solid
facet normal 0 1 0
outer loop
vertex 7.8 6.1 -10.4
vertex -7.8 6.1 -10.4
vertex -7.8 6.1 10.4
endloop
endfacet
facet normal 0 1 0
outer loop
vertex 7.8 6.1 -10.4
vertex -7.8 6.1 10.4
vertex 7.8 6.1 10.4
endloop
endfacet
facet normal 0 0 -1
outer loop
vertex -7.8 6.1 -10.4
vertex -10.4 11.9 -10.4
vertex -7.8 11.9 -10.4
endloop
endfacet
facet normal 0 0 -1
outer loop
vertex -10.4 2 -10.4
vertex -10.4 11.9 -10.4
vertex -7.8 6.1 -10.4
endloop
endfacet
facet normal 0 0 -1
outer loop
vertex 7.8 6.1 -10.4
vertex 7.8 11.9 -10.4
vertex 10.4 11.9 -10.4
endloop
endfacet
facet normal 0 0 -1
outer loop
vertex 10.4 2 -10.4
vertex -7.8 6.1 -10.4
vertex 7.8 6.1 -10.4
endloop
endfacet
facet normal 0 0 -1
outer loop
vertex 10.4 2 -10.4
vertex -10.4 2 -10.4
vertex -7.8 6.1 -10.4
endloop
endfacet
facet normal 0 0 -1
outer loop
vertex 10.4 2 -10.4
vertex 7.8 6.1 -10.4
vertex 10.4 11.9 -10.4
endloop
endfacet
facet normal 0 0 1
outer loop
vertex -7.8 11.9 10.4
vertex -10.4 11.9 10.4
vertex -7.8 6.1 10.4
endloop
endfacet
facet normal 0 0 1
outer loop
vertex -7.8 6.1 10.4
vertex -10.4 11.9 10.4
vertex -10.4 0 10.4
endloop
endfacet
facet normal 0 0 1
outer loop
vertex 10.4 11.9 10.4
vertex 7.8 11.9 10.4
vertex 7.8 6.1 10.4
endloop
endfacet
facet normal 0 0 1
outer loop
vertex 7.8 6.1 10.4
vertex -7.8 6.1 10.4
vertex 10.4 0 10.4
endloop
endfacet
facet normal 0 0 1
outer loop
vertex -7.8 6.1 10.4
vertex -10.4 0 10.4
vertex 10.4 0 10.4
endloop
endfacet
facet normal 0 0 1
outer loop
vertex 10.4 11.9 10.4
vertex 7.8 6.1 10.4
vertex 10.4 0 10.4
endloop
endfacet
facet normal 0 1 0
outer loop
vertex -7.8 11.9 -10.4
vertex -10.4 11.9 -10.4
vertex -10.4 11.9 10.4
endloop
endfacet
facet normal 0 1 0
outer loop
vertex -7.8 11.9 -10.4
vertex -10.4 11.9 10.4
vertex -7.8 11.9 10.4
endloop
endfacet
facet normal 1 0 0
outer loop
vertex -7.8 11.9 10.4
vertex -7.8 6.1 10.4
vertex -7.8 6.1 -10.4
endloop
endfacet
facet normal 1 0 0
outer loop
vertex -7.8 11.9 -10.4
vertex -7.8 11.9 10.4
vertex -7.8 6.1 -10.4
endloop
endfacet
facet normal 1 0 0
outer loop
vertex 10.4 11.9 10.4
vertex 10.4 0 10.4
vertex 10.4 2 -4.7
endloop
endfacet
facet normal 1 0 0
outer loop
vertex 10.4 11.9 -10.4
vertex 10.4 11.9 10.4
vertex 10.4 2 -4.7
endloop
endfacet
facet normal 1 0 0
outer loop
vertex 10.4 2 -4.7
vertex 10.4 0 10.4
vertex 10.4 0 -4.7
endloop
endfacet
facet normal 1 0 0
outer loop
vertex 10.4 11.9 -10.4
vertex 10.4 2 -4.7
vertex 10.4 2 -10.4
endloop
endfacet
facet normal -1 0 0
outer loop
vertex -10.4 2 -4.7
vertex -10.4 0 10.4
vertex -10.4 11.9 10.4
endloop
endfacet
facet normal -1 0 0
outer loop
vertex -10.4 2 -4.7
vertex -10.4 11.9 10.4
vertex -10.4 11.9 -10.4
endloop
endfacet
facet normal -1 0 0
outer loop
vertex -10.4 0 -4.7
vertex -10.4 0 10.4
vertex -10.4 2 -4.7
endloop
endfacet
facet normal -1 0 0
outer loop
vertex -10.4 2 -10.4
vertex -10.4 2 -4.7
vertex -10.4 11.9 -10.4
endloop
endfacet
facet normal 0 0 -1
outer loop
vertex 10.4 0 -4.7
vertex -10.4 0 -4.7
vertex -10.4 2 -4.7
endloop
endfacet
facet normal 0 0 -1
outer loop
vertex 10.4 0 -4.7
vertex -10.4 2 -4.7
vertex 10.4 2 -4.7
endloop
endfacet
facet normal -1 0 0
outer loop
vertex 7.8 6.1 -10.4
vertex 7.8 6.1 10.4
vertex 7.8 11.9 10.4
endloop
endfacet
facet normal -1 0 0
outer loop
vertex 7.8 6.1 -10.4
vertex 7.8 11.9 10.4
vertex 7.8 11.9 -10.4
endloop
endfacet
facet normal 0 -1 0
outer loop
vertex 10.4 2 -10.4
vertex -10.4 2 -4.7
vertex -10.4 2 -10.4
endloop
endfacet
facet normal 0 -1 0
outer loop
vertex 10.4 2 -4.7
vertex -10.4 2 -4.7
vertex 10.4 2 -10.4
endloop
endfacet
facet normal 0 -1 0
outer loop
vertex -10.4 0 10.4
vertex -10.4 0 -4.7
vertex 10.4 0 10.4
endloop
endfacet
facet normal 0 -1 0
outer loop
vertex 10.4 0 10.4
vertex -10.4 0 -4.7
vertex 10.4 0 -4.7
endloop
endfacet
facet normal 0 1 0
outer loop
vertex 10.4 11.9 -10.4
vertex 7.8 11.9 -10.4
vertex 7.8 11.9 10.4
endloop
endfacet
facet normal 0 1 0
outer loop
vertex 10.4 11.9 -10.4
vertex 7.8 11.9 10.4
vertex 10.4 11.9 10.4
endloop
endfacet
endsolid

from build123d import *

# Parameters (mm, degrees)
SKETCH_1_W          = 20.8
SKETCH_1_H          = 20.8
EXTRUDE_1_DEPTH     = 6.1
EXTRUDE_START       = -6.1
SKETCH_2_W          = 2.6
SKETCH_2_H          = 20.8
EXTRUDE_2_DEPTH     = 11.9
SKETCH_3_W          = 20.8
SKETCH_3_H          = 5.7
CUT_EXTRUDE_1_DEPTH = 2


with BuildPart() as part:
    # 草图1 → 凸台-拉伸1 (new body)
    with BuildSketch(Plane(origin=(0, 0, 0), x_dir=(1, 0, 0), z_dir=(0, 1, 0))):
        Rectangle(SKETCH_1_W, SKETCH_1_H)
    extrude(amount=EXTRUDE_1_DEPTH)

    # 草图2 → 凸台-拉伸2 (add)
    with BuildSketch(Plane(origin=(0, 6.1, 0), x_dir=(1, 0, 0), z_dir=(0, 1, 0)).offset(EXTRUDE_START)):
        with Locations((-9.1, 0)):
            Rectangle(SKETCH_2_W, SKETCH_2_H)
        with Locations((9.1, 0)):
            Rectangle(SKETCH_2_W, SKETCH_2_H)
    extrude(amount=EXTRUDE_2_DEPTH)

    # 草图3 → 切除-拉伸1 (cut)
    with BuildSketch(Plane.XZ):
        with Locations((0, -7.55)):
            Rectangle(SKETCH_3_W, SKETCH_3_H)
    extrude(amount=-CUT_EXTRUDE_1_DEPTH, mode=Mode.SUBTRACT)


solid = part.part
